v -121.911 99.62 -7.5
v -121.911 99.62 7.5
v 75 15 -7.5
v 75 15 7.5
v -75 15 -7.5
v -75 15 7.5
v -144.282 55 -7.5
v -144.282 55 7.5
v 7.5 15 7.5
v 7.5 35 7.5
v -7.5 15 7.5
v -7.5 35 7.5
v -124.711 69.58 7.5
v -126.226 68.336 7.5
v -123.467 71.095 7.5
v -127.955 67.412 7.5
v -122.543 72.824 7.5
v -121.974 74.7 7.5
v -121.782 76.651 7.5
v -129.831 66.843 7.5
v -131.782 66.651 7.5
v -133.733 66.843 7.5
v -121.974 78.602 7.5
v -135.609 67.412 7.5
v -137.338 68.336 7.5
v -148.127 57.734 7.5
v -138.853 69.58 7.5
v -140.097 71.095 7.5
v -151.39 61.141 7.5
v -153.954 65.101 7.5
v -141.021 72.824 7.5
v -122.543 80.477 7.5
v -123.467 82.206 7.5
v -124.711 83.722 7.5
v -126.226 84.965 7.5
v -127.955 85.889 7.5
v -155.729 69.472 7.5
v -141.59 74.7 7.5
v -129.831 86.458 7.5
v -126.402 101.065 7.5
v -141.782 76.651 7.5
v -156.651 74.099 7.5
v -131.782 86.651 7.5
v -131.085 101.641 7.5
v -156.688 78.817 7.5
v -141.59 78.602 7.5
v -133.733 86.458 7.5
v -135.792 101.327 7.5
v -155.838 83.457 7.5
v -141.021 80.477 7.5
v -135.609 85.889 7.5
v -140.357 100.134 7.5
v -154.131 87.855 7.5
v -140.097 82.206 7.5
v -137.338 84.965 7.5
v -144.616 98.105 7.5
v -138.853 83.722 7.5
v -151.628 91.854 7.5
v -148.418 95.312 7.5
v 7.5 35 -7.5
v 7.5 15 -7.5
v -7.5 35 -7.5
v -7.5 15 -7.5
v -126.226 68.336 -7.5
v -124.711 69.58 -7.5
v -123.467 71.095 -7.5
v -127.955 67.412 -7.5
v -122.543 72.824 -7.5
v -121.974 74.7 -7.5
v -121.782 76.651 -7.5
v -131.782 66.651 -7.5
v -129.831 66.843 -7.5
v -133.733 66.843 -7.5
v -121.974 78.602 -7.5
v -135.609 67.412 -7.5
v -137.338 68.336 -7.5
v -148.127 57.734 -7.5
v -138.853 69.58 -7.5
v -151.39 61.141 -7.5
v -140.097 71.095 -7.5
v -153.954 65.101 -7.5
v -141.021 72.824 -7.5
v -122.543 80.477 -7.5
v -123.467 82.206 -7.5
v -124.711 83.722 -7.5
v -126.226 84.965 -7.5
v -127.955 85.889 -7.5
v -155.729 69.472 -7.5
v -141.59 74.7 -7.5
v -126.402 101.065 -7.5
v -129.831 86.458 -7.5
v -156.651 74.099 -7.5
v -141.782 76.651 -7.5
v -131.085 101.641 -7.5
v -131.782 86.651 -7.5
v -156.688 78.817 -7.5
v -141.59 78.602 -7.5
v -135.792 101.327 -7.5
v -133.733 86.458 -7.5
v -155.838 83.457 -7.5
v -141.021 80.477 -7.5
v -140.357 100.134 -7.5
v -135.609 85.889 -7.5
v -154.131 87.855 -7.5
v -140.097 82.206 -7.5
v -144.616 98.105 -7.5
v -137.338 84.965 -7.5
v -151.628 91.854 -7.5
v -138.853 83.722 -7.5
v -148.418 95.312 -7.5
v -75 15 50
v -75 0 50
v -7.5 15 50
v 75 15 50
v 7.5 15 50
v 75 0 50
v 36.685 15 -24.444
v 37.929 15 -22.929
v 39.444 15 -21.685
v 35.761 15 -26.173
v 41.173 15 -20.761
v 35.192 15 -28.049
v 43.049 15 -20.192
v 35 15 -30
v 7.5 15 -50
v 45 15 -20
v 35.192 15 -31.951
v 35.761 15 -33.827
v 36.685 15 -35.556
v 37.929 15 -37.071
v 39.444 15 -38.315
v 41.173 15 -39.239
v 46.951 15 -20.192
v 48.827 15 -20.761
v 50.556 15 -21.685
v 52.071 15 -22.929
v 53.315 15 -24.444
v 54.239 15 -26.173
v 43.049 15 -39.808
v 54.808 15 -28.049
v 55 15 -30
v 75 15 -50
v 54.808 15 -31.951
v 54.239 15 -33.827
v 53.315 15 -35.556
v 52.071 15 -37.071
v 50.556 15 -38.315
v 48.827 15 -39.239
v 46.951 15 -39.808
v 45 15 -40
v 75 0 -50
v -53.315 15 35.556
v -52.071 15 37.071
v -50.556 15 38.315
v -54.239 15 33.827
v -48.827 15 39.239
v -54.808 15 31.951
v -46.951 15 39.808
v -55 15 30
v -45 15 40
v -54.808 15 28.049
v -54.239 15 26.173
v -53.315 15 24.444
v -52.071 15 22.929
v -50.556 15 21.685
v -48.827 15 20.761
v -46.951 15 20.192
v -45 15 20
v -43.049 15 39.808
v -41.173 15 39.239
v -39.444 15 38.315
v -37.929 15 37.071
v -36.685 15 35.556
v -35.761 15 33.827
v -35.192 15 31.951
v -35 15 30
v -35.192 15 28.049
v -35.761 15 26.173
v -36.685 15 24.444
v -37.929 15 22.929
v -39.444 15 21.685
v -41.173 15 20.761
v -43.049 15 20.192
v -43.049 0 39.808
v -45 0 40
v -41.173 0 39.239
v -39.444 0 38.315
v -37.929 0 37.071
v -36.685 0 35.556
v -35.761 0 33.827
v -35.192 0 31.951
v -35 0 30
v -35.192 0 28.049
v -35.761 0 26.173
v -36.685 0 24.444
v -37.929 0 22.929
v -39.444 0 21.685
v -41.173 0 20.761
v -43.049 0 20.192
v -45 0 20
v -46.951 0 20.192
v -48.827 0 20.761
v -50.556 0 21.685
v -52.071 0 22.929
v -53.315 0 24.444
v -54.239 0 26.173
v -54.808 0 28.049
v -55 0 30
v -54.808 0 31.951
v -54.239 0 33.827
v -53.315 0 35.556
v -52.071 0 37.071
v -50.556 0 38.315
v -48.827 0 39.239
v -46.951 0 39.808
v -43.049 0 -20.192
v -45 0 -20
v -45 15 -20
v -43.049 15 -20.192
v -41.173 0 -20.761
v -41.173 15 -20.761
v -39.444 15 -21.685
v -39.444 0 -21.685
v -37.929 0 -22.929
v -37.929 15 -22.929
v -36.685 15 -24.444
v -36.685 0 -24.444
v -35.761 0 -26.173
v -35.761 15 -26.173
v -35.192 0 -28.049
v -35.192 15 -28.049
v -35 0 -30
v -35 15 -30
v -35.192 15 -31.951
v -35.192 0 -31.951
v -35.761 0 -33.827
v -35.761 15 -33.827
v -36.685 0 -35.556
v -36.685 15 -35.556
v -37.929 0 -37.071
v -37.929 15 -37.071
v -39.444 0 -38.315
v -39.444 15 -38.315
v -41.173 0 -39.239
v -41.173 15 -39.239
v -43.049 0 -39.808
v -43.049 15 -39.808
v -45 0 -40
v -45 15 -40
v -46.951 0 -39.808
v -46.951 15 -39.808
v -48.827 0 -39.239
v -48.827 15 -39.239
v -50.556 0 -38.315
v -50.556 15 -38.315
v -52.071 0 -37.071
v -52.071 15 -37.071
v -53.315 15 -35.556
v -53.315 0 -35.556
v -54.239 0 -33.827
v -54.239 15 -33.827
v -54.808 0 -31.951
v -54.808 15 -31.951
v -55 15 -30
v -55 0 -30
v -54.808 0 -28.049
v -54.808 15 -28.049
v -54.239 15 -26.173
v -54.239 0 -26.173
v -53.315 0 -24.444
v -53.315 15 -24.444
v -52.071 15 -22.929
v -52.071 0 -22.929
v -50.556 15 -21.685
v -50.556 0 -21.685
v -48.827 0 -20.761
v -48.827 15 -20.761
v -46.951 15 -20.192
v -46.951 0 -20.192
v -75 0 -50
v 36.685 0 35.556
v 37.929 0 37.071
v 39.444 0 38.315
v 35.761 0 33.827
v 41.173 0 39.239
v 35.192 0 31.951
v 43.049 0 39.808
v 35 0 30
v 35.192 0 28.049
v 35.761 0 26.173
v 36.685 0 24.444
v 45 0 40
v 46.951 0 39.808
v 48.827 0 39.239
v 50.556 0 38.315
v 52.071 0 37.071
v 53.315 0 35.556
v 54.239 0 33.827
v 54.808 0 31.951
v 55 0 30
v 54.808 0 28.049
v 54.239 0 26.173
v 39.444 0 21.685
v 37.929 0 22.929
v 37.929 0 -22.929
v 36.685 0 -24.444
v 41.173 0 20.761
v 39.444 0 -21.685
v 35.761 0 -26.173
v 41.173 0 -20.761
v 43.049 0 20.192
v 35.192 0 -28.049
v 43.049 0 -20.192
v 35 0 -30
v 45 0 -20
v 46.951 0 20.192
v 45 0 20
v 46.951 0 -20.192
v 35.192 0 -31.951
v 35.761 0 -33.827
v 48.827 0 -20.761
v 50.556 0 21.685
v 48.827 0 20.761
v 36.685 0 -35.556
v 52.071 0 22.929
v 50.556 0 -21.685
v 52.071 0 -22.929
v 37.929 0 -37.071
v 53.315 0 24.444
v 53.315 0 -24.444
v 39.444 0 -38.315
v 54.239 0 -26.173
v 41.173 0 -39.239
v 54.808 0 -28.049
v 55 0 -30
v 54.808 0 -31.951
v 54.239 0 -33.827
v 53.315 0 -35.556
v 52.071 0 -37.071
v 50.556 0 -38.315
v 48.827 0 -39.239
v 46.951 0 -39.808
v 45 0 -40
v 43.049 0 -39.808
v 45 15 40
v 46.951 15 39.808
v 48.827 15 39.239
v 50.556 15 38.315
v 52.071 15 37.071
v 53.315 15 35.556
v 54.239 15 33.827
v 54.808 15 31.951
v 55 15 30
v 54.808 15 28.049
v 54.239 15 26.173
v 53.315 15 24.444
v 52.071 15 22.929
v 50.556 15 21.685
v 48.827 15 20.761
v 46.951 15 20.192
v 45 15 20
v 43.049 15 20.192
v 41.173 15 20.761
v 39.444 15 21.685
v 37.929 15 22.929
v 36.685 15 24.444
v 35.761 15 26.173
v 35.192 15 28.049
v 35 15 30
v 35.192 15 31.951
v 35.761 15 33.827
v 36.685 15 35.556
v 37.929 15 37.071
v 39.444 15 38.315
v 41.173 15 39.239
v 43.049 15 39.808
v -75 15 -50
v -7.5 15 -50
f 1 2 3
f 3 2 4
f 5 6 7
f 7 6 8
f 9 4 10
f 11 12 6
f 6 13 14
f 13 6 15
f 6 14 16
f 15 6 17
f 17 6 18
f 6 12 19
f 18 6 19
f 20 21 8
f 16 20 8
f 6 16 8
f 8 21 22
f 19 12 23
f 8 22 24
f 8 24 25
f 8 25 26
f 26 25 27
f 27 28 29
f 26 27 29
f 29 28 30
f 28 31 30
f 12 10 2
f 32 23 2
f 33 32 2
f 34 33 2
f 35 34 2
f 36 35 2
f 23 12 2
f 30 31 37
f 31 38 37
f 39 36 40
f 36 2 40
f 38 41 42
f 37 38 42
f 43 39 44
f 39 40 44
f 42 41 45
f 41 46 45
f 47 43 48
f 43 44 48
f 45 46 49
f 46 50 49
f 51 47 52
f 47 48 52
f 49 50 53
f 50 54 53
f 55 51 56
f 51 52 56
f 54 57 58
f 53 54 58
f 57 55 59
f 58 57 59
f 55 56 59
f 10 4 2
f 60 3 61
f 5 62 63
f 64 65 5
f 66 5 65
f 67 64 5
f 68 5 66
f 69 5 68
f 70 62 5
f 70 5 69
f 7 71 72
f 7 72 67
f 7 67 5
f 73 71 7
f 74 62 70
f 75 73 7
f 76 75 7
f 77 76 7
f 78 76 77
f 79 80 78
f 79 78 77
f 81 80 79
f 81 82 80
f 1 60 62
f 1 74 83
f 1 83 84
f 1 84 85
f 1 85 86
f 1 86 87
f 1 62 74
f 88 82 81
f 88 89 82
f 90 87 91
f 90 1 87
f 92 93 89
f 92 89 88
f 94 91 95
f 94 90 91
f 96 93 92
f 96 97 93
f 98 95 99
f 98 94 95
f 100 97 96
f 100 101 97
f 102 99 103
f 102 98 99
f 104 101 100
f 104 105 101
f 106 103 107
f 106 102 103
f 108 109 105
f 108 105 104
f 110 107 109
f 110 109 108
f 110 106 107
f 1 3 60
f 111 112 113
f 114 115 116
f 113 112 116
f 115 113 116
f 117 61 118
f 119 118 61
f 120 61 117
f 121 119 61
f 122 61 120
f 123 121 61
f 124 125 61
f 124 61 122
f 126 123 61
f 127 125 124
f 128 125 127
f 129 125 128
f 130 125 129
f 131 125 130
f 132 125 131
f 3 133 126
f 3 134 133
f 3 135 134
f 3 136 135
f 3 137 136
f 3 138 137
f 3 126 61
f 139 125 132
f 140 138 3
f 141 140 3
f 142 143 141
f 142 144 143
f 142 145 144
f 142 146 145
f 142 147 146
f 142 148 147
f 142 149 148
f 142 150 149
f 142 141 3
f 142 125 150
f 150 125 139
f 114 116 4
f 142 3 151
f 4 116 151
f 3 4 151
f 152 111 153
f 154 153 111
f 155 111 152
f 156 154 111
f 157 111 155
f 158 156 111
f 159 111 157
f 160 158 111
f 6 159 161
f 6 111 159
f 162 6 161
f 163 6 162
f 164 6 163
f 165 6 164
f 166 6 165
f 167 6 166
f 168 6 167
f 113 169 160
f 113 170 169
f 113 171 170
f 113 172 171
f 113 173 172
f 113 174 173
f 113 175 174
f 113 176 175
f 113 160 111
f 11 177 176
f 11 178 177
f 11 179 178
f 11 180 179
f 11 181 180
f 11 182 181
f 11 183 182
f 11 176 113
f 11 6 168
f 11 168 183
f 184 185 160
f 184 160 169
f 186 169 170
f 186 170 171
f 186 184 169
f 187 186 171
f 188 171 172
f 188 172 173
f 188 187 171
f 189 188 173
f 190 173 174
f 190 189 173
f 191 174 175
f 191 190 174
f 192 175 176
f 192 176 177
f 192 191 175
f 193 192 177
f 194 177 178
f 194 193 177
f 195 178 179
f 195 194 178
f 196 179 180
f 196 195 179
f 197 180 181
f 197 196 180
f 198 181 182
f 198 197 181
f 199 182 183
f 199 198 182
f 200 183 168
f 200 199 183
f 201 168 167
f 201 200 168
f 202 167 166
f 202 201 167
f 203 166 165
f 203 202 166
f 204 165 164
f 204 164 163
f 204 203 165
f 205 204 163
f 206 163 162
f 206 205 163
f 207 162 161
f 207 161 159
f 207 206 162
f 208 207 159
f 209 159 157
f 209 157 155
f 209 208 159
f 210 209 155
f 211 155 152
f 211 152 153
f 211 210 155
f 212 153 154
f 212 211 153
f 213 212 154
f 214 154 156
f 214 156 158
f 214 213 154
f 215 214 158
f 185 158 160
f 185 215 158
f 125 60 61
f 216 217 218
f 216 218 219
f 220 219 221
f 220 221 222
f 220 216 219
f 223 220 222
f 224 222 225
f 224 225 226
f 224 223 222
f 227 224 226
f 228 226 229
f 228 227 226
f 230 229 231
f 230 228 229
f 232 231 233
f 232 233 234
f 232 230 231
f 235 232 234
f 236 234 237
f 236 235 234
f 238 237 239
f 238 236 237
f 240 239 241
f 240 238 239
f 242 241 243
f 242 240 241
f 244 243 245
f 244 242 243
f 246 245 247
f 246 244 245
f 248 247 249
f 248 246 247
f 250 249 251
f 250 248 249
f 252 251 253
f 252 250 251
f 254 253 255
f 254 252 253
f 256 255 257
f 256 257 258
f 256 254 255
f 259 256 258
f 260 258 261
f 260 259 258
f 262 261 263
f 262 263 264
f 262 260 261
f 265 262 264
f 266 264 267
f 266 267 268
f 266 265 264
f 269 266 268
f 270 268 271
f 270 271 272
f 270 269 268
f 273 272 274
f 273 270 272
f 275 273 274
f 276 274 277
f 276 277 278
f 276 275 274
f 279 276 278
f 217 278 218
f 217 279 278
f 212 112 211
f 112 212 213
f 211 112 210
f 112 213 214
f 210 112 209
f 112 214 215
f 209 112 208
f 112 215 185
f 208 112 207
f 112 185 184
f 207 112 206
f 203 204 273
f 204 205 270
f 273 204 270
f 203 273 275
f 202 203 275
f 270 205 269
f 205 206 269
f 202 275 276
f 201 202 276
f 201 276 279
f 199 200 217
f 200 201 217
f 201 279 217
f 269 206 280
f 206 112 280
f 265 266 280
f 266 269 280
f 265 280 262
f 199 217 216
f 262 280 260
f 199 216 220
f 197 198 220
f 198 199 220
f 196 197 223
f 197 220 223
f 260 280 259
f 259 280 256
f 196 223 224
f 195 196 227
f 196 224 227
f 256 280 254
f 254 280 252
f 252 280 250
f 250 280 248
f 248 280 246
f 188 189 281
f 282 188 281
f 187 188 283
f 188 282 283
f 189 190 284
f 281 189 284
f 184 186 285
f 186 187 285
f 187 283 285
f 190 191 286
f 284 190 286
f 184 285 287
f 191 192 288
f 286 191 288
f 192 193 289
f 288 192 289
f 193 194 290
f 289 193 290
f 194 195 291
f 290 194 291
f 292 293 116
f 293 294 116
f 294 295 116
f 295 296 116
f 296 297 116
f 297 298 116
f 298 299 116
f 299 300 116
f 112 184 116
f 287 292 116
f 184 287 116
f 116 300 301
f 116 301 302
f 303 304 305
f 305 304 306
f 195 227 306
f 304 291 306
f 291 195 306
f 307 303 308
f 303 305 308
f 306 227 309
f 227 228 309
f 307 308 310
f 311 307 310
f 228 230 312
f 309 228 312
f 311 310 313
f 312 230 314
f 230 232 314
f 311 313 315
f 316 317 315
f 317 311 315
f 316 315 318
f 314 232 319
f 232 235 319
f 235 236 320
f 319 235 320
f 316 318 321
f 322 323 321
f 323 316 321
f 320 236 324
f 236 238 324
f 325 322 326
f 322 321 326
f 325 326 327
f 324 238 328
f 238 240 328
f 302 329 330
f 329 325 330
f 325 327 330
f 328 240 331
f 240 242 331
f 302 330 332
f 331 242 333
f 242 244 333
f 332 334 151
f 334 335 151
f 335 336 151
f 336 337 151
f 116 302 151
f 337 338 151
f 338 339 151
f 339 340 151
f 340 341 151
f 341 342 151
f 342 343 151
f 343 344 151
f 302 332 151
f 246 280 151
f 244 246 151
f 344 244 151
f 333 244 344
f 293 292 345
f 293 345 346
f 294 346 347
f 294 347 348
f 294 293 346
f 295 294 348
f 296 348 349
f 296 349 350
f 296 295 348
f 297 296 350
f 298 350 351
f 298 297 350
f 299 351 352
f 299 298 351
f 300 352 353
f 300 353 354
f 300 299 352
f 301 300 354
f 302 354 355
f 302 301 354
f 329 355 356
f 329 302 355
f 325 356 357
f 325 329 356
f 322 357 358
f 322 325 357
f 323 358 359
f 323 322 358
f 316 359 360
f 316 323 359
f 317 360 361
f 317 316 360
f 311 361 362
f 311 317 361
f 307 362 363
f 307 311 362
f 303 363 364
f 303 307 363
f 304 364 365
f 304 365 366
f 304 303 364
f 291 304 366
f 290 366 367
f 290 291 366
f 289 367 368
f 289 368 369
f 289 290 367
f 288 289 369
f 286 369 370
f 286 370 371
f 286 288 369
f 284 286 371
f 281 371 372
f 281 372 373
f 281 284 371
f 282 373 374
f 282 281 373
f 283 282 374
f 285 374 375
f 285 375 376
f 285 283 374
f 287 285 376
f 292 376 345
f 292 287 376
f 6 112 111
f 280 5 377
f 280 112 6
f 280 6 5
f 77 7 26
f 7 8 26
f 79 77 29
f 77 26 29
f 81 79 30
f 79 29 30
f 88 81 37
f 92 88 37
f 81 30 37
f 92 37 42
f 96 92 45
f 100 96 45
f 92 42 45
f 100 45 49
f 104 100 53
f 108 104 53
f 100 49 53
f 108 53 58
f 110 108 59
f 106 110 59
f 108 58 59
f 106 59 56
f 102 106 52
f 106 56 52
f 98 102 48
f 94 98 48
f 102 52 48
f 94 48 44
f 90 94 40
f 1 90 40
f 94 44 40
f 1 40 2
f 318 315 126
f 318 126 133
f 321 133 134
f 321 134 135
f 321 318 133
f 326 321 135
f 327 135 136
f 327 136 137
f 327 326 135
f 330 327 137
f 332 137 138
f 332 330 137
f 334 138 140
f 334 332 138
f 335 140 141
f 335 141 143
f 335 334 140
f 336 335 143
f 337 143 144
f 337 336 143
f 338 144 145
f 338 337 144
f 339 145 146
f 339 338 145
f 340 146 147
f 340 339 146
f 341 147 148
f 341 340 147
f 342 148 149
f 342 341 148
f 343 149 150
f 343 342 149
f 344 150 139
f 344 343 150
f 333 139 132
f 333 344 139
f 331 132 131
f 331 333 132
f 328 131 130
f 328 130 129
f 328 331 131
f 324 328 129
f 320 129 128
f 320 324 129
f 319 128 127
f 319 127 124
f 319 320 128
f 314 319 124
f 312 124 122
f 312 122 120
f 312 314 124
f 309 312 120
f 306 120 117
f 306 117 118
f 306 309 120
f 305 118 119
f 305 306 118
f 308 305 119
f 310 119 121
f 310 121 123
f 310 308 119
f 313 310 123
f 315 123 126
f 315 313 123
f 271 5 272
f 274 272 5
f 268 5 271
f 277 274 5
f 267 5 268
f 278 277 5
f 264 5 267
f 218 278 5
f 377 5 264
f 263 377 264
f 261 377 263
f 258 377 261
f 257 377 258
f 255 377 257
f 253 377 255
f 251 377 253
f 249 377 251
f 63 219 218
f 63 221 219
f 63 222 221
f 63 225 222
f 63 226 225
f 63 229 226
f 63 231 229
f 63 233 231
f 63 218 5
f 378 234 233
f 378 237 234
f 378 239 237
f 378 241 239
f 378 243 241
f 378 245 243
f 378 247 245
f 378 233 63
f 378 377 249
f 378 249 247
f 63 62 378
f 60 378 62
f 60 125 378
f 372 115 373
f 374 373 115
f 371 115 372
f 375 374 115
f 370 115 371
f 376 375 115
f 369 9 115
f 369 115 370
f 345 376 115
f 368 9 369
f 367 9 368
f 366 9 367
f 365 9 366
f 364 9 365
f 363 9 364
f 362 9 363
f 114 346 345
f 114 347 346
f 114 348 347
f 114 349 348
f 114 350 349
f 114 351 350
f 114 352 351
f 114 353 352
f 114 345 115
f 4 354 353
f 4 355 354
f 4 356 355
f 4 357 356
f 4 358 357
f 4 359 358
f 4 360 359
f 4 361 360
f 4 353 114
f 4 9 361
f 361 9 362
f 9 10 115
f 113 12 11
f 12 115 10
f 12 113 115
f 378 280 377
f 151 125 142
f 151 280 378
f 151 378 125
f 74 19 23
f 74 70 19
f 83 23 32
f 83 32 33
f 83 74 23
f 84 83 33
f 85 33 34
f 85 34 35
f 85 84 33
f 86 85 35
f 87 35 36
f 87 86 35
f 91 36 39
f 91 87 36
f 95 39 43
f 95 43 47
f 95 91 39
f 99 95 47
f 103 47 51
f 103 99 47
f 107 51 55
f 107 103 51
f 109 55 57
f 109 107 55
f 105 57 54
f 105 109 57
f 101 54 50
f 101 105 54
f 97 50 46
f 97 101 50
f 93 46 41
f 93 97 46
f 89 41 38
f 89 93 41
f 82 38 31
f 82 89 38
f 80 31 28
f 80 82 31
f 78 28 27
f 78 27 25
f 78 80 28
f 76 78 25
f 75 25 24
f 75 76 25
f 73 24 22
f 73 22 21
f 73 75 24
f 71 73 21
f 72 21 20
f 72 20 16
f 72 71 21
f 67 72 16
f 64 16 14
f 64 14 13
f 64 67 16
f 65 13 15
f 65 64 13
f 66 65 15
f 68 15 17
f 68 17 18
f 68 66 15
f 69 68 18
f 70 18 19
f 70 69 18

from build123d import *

# Parameters (mm, degrees)
SKETCH1_W           = 150
SKETCH1_H           = 100
SKETCH1_R           = 10
BOSS_EXTRUDE1_DEPTH = 15
SKETCH2_R           = 10
BOSS_EXTRUDE2_DEPTH = 7.5
BOSS_EXTRUDE3_DEPTH = 7.5


with BuildPart() as part:
    # Sketch1 → Boss-Extrude1 (new body)
    with BuildSketch(Plane(origin=(0, 0, 0), x_dir=(1, 0, 0), z_dir=(0, 1, 0))):
        Rectangle(SKETCH1_W, SKETCH1_H)
        with Locations(Location((-45, 30, 0), (0, 0, 270))):
            Circle(SKETCH1_R, mode=Mode.SUBTRACT)
        with Locations(Location((45, 30, 0), (0, 0, 270))):
            Circle(SKETCH1_R, mode=Mode.SUBTRACT)
        with Locations(Location((45, -30, 0), (0, 0, 270))):
            Circle(SKETCH1_R, mode=Mode.SUBTRACT)
        with Locations(Location((-45, -30, 0), (0, 0, 270))):
            Circle(SKETCH1_R, mode=Mode.SUBTRACT)
    extrude(amount=BOSS_EXTRUDE1_DEPTH)

    # Sketch2 → Boss-Extrude2 (add, symmetric)
    with BuildSketch(Plane.XY):
        with BuildLine():
            Line((75, 15), (-75, 15))
            Line((-75, 15), (-144.282032303, 55))
            ThreePointArc((-144.282032303, 55), (-154.13052805, 87.855309915), (-121.911493446, 99.61958071))
            Line((-121.911493446, 99.61958071), (75, 15))
        make_face()
        with Locations((-131.782032303, 76.650635095)):
            Circle(SKETCH2_R, mode=Mode.SUBTRACT)
    extrude(amount=BOSS_EXTRUDE2_DEPTH, both=True)

    # Sketch3 → Boss-Extrude3 (add, symmetric)
    with BuildSketch(Plane(origin=(0, 0, 0), x_dir=(0, 0, -1), z_dir=(1, 0, 0))):
        Polygon((-7.5, 35), (-7.5, 15), (-50, 15), align=None)
        Polygon((50, 15), (7.5, 35), (7.5, 15), align=None)
    extrude(amount=BOSS_EXTRUDE3_DEPTH, both=True)


solid = part.part
